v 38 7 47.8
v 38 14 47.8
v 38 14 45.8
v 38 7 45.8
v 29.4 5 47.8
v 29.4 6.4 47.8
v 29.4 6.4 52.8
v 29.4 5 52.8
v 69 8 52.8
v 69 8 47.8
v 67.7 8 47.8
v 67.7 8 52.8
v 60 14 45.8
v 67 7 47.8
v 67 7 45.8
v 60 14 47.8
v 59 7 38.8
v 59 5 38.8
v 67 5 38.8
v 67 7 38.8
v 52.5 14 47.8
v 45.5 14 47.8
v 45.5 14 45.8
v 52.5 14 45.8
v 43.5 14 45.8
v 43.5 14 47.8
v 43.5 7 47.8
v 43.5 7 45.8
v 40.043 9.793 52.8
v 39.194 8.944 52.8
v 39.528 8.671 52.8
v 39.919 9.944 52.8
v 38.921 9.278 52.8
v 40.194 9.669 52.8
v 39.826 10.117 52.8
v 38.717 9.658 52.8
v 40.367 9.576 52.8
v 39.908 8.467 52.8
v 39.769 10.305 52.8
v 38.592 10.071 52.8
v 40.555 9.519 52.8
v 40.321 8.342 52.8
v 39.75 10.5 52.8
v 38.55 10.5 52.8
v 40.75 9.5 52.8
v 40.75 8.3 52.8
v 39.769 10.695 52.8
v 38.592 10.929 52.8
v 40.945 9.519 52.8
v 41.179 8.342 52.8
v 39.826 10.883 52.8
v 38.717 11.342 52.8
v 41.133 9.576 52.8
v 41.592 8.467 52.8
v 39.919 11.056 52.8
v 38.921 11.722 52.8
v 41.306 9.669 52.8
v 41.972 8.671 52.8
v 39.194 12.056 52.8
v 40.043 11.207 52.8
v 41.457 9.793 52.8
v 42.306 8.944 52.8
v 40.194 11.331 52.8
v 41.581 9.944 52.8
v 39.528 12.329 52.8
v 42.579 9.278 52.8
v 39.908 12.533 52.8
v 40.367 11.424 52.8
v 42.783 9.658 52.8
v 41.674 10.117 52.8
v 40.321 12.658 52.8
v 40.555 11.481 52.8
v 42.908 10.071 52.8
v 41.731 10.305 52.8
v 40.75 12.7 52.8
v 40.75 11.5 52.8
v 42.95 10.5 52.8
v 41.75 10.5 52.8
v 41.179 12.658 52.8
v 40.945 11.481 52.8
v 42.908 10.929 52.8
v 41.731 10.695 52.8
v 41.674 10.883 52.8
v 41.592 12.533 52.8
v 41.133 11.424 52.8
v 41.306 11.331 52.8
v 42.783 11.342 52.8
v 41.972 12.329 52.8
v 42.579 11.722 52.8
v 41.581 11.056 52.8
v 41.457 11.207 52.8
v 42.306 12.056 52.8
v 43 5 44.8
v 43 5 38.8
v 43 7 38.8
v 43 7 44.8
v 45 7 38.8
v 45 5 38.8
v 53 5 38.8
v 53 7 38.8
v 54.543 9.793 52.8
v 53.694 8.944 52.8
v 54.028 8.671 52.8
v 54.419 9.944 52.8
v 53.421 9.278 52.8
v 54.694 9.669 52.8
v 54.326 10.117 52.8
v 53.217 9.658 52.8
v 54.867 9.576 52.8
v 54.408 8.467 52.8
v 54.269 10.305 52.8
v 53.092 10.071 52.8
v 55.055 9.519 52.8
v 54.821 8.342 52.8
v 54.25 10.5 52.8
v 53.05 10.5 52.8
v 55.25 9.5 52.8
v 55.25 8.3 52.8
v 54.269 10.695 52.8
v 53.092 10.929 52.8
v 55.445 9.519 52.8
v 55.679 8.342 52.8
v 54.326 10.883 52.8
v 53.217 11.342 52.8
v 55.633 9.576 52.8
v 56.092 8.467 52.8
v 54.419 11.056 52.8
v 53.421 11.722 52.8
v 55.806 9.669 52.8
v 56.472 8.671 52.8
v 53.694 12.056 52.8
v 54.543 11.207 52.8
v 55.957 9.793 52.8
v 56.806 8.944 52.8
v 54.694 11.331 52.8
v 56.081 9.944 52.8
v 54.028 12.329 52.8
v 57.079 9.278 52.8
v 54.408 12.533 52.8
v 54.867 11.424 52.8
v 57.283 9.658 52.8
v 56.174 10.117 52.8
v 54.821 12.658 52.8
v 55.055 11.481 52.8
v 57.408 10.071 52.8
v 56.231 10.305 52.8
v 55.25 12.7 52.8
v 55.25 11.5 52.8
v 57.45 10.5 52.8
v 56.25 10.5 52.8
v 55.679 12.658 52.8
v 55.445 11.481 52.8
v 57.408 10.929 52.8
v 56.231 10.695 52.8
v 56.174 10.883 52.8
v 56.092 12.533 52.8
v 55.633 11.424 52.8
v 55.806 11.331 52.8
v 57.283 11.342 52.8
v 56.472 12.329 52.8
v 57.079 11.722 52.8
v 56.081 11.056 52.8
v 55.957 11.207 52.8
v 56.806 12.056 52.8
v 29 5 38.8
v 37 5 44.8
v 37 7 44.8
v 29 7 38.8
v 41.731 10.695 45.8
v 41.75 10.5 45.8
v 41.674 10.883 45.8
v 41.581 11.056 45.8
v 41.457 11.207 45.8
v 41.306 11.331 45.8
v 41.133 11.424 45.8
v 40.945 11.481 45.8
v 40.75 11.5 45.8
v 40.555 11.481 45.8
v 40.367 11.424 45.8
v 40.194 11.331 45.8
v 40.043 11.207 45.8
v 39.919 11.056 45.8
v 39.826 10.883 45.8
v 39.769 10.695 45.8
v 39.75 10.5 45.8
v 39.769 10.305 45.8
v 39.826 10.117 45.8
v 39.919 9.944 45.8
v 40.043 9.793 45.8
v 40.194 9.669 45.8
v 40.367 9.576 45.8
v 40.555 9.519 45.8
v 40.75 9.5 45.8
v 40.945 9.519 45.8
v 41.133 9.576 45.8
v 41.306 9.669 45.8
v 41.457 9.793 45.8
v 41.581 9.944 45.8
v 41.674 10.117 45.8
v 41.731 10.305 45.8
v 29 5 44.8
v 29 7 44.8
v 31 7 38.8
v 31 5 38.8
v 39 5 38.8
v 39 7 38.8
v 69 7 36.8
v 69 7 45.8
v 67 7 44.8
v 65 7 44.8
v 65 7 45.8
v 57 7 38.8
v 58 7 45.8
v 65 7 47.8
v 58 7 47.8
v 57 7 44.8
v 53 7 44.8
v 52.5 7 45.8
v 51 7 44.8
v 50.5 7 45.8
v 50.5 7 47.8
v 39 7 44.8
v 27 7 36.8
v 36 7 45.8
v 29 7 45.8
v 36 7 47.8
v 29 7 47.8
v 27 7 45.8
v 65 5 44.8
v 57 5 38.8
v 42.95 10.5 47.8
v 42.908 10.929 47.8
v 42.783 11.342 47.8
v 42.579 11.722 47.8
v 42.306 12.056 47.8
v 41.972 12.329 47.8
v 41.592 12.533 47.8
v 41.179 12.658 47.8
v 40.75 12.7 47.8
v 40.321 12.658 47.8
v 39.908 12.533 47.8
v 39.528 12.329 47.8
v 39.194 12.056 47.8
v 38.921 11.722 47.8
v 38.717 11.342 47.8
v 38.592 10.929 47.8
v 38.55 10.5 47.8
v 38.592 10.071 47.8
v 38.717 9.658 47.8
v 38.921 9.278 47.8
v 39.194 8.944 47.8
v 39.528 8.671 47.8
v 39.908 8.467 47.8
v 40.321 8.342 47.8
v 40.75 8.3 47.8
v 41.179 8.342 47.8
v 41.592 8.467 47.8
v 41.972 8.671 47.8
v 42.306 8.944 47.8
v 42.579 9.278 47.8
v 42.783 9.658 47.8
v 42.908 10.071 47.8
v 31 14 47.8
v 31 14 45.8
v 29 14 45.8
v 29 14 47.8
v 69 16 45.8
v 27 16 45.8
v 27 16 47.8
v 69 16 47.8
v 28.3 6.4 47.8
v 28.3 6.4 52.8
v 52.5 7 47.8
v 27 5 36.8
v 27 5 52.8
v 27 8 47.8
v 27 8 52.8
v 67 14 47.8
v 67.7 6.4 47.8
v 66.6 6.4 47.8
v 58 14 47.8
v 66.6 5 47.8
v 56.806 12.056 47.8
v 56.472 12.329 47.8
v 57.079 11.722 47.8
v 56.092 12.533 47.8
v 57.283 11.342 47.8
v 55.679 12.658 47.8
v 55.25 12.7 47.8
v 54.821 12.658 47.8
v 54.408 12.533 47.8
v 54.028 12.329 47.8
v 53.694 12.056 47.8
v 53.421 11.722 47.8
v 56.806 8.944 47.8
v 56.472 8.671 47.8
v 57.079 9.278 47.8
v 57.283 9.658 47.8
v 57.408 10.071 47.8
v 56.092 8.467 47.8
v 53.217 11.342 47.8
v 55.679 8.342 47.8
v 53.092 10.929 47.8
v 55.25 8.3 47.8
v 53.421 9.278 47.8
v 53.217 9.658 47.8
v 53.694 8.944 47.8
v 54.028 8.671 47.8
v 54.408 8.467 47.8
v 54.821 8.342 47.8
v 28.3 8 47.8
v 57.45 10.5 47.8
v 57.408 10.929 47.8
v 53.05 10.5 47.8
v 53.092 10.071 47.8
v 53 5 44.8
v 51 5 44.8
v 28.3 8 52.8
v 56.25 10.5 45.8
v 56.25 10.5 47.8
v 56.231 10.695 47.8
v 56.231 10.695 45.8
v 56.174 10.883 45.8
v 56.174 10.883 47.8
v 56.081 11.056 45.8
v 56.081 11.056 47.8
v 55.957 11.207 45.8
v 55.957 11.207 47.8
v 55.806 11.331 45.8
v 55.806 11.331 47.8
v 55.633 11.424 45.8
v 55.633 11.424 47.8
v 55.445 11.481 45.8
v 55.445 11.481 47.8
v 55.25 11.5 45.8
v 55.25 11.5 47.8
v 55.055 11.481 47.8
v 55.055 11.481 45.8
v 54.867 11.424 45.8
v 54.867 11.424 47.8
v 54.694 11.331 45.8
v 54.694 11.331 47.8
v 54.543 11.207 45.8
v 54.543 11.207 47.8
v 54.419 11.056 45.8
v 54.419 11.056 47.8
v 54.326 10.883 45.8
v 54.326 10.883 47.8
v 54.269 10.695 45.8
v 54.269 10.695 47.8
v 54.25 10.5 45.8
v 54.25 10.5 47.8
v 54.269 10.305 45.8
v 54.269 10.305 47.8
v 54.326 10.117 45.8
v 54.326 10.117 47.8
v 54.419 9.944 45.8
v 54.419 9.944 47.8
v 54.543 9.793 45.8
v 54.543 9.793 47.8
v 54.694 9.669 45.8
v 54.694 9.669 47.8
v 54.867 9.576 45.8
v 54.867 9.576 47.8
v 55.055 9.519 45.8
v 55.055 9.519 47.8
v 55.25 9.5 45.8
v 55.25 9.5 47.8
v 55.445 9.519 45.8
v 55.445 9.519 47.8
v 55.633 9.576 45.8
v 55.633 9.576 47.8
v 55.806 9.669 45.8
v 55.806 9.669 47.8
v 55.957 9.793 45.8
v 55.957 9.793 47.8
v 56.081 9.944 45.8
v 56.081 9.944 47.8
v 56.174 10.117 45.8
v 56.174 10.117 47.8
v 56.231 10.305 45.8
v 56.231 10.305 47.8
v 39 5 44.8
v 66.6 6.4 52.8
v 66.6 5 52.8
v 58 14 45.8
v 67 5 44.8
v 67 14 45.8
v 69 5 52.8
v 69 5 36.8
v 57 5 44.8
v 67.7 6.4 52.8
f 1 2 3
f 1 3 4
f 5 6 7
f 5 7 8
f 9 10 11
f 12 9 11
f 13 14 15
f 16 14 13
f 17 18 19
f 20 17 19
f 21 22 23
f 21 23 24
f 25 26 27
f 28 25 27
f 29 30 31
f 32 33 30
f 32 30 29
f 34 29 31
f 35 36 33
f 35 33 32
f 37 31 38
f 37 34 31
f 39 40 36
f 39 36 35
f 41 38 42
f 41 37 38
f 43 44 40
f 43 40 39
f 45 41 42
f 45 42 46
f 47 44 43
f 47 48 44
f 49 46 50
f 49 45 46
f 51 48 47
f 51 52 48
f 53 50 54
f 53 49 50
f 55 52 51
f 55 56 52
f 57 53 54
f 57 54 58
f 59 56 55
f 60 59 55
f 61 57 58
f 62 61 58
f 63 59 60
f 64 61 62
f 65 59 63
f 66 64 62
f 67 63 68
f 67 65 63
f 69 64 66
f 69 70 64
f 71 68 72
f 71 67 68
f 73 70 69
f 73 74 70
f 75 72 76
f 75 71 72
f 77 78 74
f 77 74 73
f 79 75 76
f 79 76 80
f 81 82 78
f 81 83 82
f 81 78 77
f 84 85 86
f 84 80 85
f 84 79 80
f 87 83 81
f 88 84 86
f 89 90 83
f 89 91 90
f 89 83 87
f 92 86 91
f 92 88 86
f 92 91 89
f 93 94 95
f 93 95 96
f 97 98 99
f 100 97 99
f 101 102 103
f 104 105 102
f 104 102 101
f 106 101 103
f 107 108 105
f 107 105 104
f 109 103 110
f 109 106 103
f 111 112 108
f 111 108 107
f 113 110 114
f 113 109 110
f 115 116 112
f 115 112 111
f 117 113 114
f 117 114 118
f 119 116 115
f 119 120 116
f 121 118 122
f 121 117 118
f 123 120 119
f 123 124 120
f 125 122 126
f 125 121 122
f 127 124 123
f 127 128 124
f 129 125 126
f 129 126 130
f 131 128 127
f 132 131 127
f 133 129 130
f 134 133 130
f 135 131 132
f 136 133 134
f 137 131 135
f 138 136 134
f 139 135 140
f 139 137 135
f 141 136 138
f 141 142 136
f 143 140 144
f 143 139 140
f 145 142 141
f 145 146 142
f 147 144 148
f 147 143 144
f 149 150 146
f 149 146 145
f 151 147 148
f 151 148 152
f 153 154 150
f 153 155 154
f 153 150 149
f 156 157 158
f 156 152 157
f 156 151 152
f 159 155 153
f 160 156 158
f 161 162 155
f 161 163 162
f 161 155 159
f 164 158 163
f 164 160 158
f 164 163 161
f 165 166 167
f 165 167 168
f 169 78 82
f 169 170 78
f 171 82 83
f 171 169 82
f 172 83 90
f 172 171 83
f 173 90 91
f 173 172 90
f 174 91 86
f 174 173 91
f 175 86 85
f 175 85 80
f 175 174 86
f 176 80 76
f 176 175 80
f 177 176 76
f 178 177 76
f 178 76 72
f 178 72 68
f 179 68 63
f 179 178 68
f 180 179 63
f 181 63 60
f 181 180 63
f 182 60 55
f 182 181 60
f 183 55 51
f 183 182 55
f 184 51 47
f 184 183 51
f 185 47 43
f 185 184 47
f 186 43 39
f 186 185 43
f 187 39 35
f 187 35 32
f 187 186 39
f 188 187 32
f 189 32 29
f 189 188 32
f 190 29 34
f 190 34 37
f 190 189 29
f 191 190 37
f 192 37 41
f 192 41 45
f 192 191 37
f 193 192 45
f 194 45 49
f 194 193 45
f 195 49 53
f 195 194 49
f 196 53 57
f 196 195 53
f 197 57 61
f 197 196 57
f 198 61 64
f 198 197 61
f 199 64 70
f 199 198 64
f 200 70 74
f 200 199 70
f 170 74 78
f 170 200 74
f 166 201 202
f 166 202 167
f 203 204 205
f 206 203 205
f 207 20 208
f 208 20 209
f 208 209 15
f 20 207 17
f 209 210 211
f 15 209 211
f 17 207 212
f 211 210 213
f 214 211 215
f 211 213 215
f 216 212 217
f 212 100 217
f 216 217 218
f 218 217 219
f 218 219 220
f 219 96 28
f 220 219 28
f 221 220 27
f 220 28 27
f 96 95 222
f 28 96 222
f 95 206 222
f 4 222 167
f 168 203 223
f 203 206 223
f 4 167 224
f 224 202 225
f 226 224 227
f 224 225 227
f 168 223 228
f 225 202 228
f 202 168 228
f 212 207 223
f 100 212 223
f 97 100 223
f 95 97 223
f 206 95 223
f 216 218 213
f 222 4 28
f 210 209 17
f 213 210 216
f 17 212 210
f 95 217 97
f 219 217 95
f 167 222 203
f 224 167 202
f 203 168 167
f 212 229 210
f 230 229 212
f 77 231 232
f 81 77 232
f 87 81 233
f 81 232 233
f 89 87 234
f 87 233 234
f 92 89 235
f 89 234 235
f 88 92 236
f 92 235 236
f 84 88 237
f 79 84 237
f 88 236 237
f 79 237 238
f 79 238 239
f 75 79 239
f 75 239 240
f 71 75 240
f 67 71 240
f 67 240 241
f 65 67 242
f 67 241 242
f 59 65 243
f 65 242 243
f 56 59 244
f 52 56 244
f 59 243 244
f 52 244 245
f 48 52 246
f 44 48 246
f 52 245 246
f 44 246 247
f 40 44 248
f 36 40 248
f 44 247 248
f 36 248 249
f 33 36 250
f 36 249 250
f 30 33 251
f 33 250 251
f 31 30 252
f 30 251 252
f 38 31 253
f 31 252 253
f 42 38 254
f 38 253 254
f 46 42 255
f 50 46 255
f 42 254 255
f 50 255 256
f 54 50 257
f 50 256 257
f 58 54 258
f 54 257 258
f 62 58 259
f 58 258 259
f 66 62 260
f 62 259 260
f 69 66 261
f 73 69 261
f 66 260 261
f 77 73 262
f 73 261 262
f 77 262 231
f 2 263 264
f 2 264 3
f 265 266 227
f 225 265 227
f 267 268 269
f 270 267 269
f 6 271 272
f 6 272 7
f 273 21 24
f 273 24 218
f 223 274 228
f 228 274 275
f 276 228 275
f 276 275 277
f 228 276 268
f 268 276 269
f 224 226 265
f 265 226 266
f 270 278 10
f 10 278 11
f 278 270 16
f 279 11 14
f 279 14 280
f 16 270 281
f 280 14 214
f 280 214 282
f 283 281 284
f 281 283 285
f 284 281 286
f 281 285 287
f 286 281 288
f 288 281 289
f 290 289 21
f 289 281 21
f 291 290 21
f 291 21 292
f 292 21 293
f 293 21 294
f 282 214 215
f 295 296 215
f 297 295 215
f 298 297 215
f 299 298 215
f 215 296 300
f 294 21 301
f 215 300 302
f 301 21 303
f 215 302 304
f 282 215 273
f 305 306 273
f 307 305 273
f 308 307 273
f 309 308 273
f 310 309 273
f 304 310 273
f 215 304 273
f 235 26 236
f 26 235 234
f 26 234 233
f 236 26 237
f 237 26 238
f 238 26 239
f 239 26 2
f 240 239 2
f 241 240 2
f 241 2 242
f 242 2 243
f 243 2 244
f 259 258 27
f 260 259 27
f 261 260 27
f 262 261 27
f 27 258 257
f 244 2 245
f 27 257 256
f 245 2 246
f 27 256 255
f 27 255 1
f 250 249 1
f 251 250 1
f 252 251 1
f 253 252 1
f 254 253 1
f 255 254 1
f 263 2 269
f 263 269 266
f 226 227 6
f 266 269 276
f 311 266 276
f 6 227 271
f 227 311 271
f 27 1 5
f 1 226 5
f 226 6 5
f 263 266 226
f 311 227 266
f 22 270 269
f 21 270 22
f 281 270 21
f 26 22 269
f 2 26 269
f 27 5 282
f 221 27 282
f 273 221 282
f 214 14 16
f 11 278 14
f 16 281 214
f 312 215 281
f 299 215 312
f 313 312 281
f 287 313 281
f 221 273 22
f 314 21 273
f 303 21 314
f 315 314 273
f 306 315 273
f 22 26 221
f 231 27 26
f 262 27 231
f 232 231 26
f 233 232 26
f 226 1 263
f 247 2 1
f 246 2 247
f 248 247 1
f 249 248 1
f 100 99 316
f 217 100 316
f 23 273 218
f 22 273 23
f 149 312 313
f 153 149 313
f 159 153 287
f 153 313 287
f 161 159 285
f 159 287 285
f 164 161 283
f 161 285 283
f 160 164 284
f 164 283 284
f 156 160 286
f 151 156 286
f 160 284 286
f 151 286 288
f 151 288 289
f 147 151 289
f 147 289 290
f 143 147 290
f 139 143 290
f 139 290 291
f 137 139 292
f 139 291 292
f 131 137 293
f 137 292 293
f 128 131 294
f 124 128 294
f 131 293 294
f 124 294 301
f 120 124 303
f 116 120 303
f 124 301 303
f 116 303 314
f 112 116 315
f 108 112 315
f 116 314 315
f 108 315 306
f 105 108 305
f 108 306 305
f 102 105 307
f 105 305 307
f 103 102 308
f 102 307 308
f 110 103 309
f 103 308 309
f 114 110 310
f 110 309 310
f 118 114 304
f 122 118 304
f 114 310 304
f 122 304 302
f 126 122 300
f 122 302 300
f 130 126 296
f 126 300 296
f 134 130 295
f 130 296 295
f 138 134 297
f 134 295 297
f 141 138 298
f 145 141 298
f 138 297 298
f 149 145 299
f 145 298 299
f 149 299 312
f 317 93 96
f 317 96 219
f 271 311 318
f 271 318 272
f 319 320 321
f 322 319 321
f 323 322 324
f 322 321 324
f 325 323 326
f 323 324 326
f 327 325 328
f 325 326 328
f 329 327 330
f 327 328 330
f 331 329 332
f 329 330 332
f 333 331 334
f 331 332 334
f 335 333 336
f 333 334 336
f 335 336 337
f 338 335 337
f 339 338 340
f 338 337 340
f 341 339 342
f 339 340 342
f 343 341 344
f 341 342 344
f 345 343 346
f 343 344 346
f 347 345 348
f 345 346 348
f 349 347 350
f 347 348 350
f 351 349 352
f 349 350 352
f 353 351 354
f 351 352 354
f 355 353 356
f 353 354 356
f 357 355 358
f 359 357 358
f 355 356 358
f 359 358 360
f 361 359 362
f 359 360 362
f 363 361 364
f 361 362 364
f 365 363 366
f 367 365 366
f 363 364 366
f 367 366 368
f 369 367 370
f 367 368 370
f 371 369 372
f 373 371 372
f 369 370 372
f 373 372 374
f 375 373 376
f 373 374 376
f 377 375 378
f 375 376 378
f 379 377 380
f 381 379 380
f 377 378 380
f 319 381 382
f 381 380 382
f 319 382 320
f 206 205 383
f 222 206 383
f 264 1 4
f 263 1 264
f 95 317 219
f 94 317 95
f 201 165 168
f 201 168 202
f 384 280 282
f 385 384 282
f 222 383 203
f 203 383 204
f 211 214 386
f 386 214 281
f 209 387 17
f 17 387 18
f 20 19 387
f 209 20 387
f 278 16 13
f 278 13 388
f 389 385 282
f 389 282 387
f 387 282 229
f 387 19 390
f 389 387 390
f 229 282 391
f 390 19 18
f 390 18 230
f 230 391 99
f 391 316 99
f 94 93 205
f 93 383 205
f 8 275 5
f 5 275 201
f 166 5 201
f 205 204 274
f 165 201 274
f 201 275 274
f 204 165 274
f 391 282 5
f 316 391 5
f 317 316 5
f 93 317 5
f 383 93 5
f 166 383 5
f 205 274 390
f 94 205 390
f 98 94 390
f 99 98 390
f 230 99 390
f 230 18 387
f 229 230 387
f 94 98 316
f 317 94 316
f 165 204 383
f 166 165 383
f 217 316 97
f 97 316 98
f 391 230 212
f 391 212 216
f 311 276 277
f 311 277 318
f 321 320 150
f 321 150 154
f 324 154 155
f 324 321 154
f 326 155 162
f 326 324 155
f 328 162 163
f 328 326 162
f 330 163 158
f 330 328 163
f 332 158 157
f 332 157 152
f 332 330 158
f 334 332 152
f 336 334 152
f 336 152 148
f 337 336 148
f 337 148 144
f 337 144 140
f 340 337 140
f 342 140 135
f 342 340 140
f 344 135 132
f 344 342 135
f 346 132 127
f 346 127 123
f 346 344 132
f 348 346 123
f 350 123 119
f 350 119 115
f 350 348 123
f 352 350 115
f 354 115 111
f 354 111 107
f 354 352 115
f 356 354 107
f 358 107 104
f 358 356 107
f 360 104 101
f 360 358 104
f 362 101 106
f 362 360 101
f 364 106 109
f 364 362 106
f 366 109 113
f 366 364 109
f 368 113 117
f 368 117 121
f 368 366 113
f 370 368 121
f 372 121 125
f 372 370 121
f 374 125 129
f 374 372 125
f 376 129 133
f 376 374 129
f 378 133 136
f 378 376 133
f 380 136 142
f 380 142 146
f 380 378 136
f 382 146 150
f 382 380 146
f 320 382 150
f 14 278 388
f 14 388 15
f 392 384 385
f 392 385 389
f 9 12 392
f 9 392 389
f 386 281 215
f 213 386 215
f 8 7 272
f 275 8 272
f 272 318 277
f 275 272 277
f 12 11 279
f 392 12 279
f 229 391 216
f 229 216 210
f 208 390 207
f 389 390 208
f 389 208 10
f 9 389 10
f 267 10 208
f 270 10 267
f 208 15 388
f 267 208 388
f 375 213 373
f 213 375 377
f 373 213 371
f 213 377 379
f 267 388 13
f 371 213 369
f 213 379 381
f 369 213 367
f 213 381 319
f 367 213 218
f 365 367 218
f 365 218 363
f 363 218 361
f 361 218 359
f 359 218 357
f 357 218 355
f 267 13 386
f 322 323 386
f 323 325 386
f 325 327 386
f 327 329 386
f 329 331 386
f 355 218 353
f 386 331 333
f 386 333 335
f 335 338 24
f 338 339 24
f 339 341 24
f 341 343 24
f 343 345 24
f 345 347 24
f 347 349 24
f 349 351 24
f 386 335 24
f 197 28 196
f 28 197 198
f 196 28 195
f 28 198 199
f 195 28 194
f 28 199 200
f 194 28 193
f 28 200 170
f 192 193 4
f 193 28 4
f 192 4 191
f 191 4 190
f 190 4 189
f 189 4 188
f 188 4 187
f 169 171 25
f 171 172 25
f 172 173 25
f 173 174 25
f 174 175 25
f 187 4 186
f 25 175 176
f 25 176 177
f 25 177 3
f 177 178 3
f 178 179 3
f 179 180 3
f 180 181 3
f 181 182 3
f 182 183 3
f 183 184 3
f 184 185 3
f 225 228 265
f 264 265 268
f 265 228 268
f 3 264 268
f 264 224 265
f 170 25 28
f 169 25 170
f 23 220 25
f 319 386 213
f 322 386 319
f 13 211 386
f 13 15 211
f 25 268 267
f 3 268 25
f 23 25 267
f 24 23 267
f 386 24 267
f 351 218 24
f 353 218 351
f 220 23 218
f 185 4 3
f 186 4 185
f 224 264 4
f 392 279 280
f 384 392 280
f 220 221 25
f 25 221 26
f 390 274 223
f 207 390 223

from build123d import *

# Parameters (mm, degrees)
PAD063_DEPTH    = 42
SKETCH118_R     = 1
POCKET024_DEPTH = 2
POCKET025_DEPTH = 2
SKETCH120_R     = 2.2
SKETCH120_R_2   = 1
PAD070_DEPTH    = 5


with BuildPart() as part:
    # Sketch102 → Pad063 (new body)
    with BuildSketch(Plane.YZ):
        Polygon((5, -11), (7, -11), (7, -2), (16, -2), (16, 0), (5, 0), align=None)
    extrude(amount=PAD063_DEPTH)

    # Sketch118 → Pocket024 (cut)
    with BuildSketch(Plane(origin=(0, 5, 0), x_dir=(1, 0, 0), z_dir=(0, 0, 1))):
        with Locations((13.75, 5.5)):
            Circle(SKETCH118_R)
        with Locations((28.25, 5.5)):
            Circle(SKETCH118_R)
        Polygon((2, 9), (2, 2), (9, 2), align=None)
        Polygon((4, 9), (11, 9), (11, 2), align=None)
        Polygon((31, 9), (31, 2), (38, 2), align=None)
        Polygon((33, 9), (40, 9), (40, 2), align=None)
        Polygon((16.5, 9), (16.5, 2), (23.5, 2), align=None)
        Polygon((18.5, 9), (25.5, 9), (25.5, 2), align=None)
    extrude(amount=-POCKET024_DEPTH, mode=Mode.SUBTRACT)

    # Sketch119 → Pocket025 (cut)
    with BuildSketch(Plane.XZ.offset(-5)):
        Polygon((2, -3), (10, -3), (2, -9), align=None)
        Polygon((12, -3), (4, -9), (12, -9), align=None)
        Polygon((30, -3), (38, -3), (30, -9), align=None)
        Polygon((40, -3), (32, -9), (40, -9), align=None)
        Polygon((16, -3), (24, -3), (16, -9), align=None)
        Polygon((26, -3), (18, -9), (26, -9), align=None)
    extrude(amount=-POCKET025_DEPTH, mode=Mode.SUBTRACT)

    # Sketch120 → Pad070 (join)
    with BuildSketch(Plane.XY):
        with Locations((13.75, 10.5)):
            Circle(SKETCH120_R)
        with Locations((13.75, 10.5)):
            Circle(SKETCH120_R_2, mode=Mode.SUBTRACT)
        with Locations((28.25, 10.5)):
            Circle(SKETCH120_R)
        with Locations((28.25, 10.5)):
            Circle(SKETCH120_R_2, mode=Mode.SUBTRACT)
        Polygon((0, 8), (1.3, 8), (1.3, 6.4), (2.4, 6.4), (2.4, 5), (0, 5), align=None)
        Polygon((42, 5), (42, 8), (40.7, 8), (40.7, 6.4), (39.6, 6.4), (39.6, 5), align=None)
    extrude(amount=PAD070_DEPTH)


with BuildPart() as part_1:
    # Body095 placement: moved
    add(part.part.moved(Location((27, 0, 47.8))))


solid = part_1.part
